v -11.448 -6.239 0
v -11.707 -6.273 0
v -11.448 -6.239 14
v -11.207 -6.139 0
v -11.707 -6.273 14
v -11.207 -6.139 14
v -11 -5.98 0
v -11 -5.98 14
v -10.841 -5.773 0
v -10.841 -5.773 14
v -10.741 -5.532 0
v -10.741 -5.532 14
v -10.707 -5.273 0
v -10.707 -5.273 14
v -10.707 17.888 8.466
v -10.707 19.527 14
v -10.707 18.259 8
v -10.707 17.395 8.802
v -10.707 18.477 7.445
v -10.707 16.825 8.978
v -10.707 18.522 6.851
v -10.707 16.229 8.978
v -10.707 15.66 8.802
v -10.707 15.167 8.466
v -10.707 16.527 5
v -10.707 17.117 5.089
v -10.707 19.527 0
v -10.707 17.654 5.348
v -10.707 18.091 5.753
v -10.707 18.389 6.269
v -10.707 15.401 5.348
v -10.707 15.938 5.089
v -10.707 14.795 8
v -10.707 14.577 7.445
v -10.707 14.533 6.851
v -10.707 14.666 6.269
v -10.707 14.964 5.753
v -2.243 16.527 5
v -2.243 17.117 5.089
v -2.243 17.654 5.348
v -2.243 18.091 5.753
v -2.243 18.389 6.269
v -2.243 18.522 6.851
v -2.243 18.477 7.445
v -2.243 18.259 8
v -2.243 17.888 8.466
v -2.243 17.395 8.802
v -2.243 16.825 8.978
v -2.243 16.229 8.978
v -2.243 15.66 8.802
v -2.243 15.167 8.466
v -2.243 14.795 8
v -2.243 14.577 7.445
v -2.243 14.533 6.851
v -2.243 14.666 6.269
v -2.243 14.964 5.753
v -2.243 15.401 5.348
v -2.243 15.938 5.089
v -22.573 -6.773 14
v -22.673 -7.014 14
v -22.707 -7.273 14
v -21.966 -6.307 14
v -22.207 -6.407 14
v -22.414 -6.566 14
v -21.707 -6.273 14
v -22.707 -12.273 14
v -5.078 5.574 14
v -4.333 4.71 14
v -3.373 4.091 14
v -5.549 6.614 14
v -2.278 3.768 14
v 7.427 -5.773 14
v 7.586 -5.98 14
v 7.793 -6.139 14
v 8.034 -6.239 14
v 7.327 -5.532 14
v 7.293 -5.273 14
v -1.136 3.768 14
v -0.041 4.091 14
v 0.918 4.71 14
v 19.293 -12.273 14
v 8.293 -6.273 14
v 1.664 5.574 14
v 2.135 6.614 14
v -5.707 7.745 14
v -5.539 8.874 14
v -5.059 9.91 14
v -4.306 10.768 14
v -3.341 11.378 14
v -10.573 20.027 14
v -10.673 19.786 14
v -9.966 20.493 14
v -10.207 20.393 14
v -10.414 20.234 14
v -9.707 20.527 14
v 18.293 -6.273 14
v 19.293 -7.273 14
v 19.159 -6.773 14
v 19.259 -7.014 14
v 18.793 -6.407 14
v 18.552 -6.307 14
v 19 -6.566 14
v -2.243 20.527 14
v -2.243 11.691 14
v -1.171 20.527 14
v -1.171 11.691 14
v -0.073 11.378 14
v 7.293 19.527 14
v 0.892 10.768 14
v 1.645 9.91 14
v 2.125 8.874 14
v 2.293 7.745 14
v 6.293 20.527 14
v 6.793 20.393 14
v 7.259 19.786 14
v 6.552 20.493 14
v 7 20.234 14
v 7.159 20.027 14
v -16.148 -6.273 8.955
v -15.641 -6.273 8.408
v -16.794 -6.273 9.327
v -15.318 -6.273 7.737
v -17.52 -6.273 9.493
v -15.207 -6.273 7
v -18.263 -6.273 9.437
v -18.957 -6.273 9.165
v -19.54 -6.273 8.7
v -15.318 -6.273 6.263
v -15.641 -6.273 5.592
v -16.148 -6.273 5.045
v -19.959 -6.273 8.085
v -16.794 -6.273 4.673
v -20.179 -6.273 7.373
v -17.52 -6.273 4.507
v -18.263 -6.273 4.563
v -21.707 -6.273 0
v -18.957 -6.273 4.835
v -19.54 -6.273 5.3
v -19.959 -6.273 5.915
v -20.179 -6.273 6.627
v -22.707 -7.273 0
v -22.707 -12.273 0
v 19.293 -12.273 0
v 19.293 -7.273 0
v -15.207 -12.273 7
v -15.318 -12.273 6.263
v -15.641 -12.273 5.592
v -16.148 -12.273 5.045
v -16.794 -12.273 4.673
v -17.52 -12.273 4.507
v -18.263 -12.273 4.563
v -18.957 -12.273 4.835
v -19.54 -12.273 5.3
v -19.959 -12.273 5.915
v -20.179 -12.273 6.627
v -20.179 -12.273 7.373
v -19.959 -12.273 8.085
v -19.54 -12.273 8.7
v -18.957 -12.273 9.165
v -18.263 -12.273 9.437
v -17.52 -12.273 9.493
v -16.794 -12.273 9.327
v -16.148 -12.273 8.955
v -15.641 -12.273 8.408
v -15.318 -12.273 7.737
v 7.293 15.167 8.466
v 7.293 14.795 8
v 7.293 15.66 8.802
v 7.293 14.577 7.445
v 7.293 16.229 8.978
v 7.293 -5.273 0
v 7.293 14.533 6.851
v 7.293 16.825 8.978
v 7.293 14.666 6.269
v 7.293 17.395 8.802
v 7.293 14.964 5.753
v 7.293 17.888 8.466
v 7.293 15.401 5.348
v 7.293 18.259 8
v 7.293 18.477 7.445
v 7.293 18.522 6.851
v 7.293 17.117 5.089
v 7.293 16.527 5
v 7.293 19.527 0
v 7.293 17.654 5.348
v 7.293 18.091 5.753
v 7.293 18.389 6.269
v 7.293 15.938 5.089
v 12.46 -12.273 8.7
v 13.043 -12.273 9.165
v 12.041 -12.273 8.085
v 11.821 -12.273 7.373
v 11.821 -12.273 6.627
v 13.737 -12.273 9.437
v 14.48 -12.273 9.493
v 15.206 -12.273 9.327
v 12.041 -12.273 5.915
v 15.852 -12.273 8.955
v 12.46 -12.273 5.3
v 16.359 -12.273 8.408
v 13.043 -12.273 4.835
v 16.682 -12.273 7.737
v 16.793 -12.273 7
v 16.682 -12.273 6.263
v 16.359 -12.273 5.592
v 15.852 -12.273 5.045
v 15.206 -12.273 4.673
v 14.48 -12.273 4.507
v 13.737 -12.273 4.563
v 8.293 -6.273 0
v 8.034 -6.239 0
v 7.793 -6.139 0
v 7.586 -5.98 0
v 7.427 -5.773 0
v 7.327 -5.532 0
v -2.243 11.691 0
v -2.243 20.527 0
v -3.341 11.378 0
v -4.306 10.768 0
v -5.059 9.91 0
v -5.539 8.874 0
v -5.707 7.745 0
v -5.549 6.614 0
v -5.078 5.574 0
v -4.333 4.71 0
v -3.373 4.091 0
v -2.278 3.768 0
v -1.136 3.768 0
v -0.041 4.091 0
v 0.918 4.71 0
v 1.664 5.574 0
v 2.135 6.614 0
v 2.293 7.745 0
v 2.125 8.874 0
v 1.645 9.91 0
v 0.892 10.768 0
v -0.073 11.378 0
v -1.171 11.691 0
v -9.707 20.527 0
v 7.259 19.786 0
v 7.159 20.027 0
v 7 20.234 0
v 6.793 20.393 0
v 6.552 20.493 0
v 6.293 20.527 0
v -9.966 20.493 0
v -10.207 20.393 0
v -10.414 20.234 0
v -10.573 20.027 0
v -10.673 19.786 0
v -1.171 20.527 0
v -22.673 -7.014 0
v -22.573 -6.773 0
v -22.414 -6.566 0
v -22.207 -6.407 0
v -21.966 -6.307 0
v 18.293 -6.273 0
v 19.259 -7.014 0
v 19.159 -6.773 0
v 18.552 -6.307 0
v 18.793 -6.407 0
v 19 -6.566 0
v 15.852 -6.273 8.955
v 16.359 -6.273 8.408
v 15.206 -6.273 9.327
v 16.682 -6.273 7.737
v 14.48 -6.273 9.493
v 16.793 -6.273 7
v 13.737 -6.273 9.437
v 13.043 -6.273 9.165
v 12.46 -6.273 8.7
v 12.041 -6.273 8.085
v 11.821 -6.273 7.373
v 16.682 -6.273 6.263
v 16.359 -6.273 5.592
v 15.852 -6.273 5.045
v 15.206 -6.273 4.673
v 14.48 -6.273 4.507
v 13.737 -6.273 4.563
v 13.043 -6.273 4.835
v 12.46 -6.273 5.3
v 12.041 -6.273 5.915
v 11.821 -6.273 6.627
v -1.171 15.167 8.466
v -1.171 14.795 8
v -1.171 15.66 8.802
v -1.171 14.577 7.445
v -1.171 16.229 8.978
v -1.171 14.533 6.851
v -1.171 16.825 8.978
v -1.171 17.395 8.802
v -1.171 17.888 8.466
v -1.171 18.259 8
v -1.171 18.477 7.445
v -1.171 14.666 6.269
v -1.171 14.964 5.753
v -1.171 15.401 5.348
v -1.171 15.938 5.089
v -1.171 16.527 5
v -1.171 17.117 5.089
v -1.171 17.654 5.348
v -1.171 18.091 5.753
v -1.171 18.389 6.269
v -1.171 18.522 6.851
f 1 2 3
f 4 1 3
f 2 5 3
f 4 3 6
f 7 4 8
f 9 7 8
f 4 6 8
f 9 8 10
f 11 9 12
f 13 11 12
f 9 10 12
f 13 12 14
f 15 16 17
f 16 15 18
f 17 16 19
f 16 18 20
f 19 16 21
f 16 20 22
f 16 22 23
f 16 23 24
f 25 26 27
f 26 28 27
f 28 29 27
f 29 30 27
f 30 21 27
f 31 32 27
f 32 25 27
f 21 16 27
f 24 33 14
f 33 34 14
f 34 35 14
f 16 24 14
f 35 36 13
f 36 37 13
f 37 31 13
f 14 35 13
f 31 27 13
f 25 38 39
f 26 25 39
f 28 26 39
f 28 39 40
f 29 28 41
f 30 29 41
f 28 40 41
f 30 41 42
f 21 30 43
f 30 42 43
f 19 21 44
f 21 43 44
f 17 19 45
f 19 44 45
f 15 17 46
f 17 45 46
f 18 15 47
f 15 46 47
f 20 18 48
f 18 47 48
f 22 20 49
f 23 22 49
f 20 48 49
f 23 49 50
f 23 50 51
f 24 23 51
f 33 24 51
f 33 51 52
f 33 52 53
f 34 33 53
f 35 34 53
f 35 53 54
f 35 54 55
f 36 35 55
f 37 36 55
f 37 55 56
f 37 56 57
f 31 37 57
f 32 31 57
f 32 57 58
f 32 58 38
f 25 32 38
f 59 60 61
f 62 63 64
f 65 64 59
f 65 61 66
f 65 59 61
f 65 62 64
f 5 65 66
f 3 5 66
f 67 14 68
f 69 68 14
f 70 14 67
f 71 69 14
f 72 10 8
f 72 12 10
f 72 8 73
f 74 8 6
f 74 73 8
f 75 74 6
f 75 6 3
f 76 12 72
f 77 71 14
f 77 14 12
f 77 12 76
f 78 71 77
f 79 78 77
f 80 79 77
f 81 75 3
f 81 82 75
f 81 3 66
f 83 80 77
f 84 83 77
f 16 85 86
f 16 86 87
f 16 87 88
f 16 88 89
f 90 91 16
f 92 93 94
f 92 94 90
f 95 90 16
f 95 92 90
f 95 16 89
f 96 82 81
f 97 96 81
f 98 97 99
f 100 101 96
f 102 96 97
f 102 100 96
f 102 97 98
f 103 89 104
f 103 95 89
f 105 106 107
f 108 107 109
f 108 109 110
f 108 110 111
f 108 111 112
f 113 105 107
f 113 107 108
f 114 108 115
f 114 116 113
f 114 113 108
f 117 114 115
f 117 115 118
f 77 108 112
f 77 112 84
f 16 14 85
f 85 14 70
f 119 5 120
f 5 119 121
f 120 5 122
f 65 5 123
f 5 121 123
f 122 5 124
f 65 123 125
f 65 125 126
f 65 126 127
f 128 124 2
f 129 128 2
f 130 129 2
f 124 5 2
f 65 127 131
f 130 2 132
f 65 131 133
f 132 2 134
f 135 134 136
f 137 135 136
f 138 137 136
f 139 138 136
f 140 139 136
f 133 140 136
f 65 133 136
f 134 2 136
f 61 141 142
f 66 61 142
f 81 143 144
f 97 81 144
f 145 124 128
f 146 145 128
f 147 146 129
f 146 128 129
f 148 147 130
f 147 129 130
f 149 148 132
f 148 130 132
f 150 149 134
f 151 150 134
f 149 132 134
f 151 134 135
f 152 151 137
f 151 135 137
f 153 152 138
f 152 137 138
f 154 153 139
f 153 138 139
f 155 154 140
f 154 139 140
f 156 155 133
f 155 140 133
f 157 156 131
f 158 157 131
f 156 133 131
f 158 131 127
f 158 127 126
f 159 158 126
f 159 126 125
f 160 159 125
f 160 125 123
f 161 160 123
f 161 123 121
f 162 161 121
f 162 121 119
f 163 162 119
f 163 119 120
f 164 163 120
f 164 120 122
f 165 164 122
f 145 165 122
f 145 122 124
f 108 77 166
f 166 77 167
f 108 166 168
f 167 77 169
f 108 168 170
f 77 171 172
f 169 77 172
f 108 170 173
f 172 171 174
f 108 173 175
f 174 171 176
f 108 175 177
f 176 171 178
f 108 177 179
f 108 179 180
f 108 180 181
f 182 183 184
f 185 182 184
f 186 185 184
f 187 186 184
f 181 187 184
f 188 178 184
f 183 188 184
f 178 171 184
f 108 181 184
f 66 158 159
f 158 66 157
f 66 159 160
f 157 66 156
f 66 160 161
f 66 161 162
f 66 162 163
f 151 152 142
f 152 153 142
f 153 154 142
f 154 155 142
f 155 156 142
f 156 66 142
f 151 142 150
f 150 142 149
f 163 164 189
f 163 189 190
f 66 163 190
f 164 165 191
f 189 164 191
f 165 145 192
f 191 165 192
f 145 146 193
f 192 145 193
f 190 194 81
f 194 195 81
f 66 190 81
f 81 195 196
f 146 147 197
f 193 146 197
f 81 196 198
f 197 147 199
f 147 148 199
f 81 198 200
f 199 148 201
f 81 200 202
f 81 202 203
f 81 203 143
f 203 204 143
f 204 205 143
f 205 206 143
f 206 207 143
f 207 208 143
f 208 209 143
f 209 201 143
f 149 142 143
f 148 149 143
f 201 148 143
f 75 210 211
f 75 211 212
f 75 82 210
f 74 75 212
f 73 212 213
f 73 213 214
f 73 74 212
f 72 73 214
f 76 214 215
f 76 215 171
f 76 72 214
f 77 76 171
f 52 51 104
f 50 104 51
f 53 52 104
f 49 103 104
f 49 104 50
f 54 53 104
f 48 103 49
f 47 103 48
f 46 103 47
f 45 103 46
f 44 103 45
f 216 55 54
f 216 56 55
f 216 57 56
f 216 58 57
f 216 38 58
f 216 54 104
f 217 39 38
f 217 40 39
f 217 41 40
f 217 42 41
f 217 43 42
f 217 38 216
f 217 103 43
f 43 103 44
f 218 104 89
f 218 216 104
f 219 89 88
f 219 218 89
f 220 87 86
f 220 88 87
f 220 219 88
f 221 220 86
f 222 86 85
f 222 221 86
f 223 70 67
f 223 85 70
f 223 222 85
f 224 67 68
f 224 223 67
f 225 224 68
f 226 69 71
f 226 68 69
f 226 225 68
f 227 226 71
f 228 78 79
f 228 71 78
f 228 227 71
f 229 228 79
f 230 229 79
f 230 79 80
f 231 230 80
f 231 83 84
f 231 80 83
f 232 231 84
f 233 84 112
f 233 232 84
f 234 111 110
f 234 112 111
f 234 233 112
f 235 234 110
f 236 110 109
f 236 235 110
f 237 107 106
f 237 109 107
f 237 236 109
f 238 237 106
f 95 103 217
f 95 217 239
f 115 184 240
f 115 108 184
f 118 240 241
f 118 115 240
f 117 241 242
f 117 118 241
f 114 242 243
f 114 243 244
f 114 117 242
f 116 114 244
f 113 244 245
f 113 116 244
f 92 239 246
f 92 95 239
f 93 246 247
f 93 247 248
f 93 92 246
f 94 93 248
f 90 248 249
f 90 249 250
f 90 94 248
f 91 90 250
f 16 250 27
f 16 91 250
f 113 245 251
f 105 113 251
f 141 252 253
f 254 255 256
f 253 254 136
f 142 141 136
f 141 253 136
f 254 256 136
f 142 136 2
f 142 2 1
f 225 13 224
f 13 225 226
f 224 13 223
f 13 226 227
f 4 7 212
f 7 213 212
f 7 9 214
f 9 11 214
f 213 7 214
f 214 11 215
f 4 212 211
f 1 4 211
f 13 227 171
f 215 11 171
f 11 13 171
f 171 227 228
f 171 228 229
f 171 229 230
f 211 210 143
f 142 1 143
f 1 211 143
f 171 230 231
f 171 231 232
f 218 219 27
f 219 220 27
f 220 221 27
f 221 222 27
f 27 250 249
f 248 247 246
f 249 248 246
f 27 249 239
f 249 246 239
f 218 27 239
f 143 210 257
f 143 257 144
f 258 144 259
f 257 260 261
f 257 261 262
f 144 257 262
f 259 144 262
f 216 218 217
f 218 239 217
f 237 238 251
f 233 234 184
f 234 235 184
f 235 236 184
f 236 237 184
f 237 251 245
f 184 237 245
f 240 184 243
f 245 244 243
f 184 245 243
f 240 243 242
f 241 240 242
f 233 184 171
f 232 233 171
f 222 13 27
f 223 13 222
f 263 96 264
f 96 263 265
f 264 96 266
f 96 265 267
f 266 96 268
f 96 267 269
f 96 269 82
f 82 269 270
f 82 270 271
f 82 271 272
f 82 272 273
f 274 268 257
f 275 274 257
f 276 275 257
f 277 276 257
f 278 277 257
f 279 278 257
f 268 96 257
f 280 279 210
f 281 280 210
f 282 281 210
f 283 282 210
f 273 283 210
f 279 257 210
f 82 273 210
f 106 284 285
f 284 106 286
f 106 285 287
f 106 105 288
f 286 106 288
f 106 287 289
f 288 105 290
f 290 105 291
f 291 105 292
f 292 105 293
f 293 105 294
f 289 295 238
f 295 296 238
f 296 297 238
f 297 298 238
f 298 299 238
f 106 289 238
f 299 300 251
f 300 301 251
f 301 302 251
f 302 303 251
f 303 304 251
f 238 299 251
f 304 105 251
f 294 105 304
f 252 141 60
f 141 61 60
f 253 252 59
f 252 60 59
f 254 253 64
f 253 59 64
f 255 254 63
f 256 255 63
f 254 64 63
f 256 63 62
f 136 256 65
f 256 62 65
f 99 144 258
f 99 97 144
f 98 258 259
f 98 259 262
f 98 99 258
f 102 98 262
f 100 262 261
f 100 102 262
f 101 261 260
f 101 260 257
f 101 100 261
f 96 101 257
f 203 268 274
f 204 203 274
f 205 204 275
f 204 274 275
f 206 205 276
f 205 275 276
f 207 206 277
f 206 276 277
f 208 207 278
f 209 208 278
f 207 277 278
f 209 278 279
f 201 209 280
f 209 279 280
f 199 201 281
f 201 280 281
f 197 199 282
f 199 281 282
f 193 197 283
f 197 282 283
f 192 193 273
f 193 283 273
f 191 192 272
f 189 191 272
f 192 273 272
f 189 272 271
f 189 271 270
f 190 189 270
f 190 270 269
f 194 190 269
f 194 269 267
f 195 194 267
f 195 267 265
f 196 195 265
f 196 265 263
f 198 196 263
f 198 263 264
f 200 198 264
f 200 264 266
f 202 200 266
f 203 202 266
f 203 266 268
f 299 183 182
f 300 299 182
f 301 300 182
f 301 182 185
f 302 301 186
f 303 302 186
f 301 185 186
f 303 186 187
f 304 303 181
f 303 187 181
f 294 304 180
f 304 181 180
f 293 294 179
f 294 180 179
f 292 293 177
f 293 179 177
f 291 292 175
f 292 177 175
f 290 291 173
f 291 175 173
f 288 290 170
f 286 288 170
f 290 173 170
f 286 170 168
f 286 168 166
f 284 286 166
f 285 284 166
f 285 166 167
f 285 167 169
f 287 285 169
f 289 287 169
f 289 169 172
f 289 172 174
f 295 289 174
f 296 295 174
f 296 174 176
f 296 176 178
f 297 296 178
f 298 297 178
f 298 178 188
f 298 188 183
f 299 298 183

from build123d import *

# Parameters (mm, degrees)
SKETCH_1_R          = 4
EXTRUDE_1_DEPTH     = 14
SKETCH_2_R          = 2.5
CUT_EXTRUDE_1_DEPTH = 14
SKETCH_3_W          = 1.071241762
SKETCH_3_H          = 14
CUT_EXTRUDE_2_DEPTH = 14
SKETCH_4_R          = 2
CUT_EXTRUDE_3_DEPTH = 60
FILLET_1_R          = 1
FILLET_2_R          = 1


with BuildPart() as part:
    # 草图1 → 凸台-拉伸1 (new body)
    with BuildSketch(Plane.XY):
        Polygon((-22.707070707, -12.272727273), (19.292929293, -12.272727273), (19.292929293, -6.272727273), (7.292929293, -6.272727273), (7.292929293, 20.527272727), (0.929292929, 20.527272727), (-10.707070707, 20.527272727), (-10.707070707, -6.272727273), (-22.707070707, -6.272727273), align=None)
        with Locations((-1.707070707, 7.727272727)):
            Circle(SKETCH_1_R, mode=Mode.SUBTRACT)
    extrude(amount=EXTRUDE_1_DEPTH)

    # 草图2 → 切除-拉伸1 (cut)
    with BuildSketch(Plane(origin=(0, -6.272727273, 0), x_dir=(1, 0, 0), z_dir=(0, 1, 0))):
        with Locations((-17.707070707, -7)):
            Circle(SKETCH_2_R)
        with Locations((14.292929293, -7)):
            Circle(SKETCH_2_R)
    extrude(amount=-CUT_EXTRUDE_1_DEPTH, mode=Mode.SUBTRACT)

    # 草图3 → 切除-拉伸2 (cut)
    with BuildSketch(Plane(origin=(0, 20.527272727, 0), x_dir=(1, 0, 0), z_dir=(0, 1, 0))):
        with Locations((-1.707070707, -7)):
            Rectangle(SKETCH_3_W, SKETCH_3_H)
    extrude(amount=-CUT_EXTRUDE_2_DEPTH, mode=Mode.SUBTRACT)

    # 草图4 → 切除-拉伸3 (cut)
    with BuildSketch(Plane(origin=(7.292929293, 0, 0), x_dir=(0, 0, -1), z_dir=(1, 0, 0))):
        with Locations((-7, 16.527272727)):
            Circle(SKETCH_4_R)
    extrude(amount=-CUT_EXTRUDE_3_DEPTH, mode=Mode.SUBTRACT)

    # 圆角1
    fillet_1_edges = [part.edges().sort_by_distance(p)[0] for p in [
        (7.292929293, 20.527272727, 7),
        (19.292929293, -6.272727273, 7),
        (-22.707070707, -6.272727273, 7),
        (-10.707070707, 20.527272727, 7),
    ]]
    fillet(fillet_1_edges, radius=FILLET_1_R)

    # 圆角2
    fillet_2_edges = [part.edges().sort_by_distance(p)[0] for p in [
        (7.292929293, -6.272727273, 7),
        (-10.707070707, -6.272727273, 7),
    ]]
    fillet(fillet_2_edges, radius=FILLET_2_R)


solid = part.part
